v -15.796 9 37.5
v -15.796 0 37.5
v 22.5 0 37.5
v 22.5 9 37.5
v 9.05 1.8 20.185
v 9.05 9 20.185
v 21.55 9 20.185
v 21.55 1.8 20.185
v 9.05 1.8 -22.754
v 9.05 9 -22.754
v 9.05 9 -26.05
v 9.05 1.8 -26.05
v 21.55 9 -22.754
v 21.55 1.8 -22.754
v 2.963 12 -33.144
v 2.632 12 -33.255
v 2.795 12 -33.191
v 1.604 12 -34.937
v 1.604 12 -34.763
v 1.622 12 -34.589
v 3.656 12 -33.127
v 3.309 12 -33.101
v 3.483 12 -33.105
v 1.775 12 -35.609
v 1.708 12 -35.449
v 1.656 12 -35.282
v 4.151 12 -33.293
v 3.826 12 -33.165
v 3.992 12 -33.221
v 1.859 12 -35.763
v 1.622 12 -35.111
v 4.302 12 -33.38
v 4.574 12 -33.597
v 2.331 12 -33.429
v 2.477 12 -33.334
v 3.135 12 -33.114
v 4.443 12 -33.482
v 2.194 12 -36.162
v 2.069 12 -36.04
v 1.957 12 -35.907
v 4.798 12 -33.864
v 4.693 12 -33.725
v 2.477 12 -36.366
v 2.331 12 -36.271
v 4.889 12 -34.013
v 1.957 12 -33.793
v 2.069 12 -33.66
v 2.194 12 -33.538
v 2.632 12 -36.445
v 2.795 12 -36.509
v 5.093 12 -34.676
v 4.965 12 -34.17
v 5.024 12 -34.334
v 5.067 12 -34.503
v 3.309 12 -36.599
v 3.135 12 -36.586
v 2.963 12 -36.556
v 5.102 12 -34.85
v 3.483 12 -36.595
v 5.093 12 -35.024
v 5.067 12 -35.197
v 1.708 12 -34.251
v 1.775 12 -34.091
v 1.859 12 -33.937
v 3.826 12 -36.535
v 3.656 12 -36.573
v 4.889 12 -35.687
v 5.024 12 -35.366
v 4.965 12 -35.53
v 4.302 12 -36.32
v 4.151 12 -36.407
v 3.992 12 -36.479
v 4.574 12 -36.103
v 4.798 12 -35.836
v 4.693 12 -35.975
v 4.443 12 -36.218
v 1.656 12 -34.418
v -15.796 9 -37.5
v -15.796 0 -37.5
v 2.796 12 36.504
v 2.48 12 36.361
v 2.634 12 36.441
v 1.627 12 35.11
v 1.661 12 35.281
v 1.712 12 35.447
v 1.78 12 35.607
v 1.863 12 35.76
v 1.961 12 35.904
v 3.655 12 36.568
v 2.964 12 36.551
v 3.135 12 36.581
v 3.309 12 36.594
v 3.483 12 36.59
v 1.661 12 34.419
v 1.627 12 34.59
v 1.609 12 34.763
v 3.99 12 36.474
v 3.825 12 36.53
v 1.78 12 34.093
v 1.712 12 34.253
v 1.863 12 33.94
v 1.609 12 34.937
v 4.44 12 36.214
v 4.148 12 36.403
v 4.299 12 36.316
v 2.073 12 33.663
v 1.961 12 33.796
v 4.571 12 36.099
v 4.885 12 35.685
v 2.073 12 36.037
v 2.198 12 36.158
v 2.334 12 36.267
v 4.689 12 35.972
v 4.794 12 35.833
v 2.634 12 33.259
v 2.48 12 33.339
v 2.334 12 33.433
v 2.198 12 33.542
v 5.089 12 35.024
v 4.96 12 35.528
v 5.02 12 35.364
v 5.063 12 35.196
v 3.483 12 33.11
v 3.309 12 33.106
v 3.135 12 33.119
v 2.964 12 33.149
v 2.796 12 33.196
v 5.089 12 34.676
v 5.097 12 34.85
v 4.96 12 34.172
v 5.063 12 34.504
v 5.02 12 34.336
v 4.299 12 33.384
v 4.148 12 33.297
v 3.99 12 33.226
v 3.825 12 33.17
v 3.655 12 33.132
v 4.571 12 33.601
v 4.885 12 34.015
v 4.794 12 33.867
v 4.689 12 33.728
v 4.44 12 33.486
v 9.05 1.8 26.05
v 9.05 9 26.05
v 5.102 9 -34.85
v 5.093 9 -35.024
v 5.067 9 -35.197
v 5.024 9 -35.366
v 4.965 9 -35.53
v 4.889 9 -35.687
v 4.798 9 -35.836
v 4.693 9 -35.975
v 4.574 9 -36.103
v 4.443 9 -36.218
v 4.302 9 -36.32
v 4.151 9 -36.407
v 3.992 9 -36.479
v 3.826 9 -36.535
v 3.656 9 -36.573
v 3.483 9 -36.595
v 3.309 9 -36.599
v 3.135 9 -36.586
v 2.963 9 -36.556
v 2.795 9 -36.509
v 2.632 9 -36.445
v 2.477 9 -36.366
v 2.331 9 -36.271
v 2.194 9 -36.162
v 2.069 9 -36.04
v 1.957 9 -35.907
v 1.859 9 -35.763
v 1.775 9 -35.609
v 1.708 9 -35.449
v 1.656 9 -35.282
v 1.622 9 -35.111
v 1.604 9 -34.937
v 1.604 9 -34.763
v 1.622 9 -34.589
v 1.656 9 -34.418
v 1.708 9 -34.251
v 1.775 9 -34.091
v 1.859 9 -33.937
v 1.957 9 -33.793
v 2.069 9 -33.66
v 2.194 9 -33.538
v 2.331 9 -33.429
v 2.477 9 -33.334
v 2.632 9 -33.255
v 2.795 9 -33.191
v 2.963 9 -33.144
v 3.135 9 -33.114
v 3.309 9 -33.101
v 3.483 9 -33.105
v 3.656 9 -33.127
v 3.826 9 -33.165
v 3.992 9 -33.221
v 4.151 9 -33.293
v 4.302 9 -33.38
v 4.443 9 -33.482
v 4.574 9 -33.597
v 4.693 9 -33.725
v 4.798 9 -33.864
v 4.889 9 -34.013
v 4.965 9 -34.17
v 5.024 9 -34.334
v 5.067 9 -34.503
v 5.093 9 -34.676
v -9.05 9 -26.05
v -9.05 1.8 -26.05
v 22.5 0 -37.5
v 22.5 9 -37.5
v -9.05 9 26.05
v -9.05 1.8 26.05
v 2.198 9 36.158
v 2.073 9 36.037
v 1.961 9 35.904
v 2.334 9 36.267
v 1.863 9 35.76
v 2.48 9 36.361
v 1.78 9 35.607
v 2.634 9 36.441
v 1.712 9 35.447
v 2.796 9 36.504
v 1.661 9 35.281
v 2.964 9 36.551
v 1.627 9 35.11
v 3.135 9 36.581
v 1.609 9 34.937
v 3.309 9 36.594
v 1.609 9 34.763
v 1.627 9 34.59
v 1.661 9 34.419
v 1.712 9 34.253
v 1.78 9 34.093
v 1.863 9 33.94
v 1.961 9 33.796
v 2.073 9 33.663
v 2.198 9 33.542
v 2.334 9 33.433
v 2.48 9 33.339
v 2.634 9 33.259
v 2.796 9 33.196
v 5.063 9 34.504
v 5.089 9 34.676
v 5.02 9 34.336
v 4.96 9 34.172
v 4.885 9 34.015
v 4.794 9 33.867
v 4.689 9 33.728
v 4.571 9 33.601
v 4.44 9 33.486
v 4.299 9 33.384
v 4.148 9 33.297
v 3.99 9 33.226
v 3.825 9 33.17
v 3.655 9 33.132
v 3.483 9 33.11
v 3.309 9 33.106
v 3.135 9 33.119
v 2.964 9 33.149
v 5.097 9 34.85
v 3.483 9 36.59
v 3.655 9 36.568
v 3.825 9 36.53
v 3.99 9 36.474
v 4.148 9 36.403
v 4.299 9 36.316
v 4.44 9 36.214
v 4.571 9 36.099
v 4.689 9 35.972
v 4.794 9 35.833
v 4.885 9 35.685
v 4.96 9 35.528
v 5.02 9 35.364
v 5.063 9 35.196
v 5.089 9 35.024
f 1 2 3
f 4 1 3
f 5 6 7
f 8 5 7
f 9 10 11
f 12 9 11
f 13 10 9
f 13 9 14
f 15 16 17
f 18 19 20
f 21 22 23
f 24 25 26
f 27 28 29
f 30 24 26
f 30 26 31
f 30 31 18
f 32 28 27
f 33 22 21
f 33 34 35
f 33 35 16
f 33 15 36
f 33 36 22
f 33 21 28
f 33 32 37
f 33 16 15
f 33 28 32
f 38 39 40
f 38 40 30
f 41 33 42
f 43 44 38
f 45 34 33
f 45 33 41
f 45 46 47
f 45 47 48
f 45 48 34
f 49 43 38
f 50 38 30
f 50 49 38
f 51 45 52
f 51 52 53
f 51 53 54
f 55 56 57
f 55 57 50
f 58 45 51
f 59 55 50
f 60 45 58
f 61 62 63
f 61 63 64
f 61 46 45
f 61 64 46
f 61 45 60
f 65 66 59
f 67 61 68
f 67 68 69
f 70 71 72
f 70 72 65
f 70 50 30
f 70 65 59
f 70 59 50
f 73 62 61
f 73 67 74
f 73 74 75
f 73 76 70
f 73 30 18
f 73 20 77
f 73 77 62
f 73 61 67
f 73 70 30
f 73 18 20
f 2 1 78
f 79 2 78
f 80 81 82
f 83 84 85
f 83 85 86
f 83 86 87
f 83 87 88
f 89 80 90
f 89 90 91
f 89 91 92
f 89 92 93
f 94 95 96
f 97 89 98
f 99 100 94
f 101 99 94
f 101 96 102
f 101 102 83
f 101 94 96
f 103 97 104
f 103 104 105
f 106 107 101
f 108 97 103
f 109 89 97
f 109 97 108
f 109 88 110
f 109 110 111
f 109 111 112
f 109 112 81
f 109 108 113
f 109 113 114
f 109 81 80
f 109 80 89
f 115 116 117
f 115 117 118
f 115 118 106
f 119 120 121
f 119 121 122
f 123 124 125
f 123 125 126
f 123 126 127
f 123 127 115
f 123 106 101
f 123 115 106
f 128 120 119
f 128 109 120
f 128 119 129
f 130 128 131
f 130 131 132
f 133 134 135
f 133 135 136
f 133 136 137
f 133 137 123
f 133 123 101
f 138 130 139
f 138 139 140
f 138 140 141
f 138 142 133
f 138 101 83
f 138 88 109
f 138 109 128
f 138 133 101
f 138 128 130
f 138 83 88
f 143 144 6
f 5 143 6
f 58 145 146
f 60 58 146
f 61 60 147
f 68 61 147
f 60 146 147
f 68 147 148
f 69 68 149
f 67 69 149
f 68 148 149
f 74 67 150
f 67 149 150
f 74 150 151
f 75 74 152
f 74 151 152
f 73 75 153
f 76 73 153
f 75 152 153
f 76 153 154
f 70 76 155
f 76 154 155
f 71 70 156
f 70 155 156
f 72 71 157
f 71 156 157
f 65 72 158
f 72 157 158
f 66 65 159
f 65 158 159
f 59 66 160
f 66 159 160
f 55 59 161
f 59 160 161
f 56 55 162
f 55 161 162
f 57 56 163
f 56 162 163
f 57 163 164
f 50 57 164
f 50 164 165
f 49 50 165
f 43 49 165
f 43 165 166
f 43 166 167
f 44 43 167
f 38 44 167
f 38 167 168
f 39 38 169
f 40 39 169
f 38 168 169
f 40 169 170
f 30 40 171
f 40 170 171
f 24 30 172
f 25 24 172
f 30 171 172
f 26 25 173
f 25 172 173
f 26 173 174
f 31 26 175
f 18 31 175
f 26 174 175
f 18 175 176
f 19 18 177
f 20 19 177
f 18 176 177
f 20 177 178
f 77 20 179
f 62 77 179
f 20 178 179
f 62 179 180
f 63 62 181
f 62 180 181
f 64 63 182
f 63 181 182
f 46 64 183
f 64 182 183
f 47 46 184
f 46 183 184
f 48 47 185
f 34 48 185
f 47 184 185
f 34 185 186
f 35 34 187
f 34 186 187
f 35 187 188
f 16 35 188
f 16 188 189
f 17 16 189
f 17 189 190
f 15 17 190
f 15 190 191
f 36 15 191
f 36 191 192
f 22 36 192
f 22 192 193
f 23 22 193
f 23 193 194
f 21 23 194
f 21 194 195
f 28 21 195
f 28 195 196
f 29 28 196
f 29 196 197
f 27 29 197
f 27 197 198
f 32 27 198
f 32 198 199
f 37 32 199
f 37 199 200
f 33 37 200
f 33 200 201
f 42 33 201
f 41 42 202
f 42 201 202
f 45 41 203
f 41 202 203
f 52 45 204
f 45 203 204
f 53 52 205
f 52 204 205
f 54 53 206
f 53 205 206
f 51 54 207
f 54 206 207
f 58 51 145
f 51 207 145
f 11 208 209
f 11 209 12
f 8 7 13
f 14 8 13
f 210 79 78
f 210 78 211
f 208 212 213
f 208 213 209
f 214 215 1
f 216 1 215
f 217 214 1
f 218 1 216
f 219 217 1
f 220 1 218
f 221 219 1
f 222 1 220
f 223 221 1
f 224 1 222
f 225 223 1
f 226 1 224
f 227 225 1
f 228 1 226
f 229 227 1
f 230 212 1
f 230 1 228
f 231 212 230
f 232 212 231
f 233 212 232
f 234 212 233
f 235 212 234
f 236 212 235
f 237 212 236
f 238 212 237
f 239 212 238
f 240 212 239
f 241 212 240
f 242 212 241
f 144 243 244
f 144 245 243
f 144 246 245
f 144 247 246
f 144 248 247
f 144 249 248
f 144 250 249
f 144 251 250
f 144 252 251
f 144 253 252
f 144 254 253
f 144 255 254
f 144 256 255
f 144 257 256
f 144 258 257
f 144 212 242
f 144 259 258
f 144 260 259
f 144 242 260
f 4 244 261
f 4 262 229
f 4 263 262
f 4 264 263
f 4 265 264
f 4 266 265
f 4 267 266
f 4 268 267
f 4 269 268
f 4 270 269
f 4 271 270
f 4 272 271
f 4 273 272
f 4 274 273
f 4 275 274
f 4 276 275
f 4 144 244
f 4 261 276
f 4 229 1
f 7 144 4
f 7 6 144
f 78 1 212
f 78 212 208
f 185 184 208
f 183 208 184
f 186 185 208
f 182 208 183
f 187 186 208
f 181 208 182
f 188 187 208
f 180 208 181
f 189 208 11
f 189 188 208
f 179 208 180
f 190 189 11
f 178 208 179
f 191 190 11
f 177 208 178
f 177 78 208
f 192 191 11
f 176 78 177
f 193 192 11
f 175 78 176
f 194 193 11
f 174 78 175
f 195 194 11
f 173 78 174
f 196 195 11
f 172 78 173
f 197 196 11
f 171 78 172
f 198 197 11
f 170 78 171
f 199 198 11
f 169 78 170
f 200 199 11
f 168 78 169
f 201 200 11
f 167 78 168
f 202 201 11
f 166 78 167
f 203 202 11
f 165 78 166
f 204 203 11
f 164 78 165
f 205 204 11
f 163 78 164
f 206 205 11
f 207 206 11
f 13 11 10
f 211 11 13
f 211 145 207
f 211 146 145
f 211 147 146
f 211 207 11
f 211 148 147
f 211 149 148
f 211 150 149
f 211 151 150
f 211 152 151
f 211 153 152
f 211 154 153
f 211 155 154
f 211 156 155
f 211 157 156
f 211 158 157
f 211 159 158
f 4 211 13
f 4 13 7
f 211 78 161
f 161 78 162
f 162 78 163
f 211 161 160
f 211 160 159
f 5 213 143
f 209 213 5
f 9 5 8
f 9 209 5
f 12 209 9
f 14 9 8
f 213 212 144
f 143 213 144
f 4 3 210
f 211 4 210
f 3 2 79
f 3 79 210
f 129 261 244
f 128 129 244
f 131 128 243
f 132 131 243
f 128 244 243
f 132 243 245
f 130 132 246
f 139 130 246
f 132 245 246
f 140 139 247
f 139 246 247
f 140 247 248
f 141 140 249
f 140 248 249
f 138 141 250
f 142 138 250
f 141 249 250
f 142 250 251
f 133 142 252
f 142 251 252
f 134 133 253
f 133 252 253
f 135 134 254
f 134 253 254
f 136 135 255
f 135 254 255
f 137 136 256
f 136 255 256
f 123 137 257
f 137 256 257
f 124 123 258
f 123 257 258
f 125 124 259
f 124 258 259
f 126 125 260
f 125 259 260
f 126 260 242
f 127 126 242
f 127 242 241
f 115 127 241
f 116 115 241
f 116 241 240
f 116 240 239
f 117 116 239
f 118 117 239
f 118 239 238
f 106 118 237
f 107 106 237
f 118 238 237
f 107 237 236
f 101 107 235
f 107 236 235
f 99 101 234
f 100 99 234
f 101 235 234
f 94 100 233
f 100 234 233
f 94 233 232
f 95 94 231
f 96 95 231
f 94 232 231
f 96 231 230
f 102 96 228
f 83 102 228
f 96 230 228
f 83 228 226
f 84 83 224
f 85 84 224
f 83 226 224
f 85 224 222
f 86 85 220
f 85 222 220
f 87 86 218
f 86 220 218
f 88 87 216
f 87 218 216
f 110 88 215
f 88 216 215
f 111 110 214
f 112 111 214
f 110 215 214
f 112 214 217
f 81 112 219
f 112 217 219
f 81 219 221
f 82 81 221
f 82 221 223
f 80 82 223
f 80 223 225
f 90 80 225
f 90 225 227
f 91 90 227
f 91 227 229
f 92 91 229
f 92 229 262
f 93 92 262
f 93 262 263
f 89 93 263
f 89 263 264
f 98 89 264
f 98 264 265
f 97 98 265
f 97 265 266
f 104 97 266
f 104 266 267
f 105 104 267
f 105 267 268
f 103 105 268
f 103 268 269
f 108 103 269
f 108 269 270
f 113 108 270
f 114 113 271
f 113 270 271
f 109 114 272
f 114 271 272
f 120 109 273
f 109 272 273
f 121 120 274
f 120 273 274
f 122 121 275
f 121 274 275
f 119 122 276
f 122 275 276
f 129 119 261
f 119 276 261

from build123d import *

# Parameters (mm, degrees)
CROQUIS1_W              = 45
CROQUIS1_H              = 75
SALIENTE_EXTRUIR1_DEPTH = 9
CROQUIS2_W              = 18.1
CROQUIS2_H              = 52.1
CROQUIS2_W_2            = 12.5
CROQUIS2_H_2            = 42.938951505
CORTAR_EXTRUIR9_DEPTH   = 7.2
CROQUIS3_W              = 6.70437092
CROQUIS3_H              = 75
CORTAR_EXTRUIR10_DEPTH  = 9
CROQUIS4_R              = 1.745
CROQUIS4_R_2            = 1.75
SALIENTE_EXTRUIR2_DEPTH = 3


with BuildPart() as part:
    # Croquis1 → Saliente-Extruir1 (new body)
    with BuildSketch(Plane(origin=(0, 0, 0), x_dir=(1, 0, 0), z_dir=(0, 1, 0))):
        Rectangle(CROQUIS1_W, CROQUIS1_H)
    extrude(amount=SALIENTE_EXTRUIR1_DEPTH)

    # Croquis2 → Cortar-Extruir9 (cut)
    with BuildSketch(Plane(origin=(0, 9, 0), x_dir=(1, 0, 0), z_dir=(0, 1, 0))):
        Rectangle(CROQUIS2_W, CROQUIS2_H)
        with Locations((15.3, 1.284934341)):
            Rectangle(CROQUIS2_W_2, CROQUIS2_H_2)
    extrude(amount=-CORTAR_EXTRUIR9_DEPTH, mode=Mode.SUBTRACT)

    # Croquis3 → Cortar-Extruir10 (cut)
    with BuildSketch(Plane(origin=(0, 9, 0), x_dir=(1, 0, 0), z_dir=(0, 1, 0))):
        with Locations((-19.14781454, 0)):
            Rectangle(CROQUIS3_W, CROQUIS3_H)
    extrude(amount=-CORTAR_EXTRUIR10_DEPTH, mode=Mode.SUBTRACT)

    # Croquis4 → Saliente-Extruir2 (add)
    with BuildSketch(Plane(origin=(0, 9, 0), x_dir=(1, 0, 0), z_dir=(0, 1, 0))):
        with Locations((3.35218546, -34.85)):
            Circle(CROQUIS4_R)
        with Locations((3.35218546, 34.85)):
            Circle(CROQUIS4_R_2)
    extrude(amount=SALIENTE_EXTRUIR2_DEPTH)


solid = part.part
